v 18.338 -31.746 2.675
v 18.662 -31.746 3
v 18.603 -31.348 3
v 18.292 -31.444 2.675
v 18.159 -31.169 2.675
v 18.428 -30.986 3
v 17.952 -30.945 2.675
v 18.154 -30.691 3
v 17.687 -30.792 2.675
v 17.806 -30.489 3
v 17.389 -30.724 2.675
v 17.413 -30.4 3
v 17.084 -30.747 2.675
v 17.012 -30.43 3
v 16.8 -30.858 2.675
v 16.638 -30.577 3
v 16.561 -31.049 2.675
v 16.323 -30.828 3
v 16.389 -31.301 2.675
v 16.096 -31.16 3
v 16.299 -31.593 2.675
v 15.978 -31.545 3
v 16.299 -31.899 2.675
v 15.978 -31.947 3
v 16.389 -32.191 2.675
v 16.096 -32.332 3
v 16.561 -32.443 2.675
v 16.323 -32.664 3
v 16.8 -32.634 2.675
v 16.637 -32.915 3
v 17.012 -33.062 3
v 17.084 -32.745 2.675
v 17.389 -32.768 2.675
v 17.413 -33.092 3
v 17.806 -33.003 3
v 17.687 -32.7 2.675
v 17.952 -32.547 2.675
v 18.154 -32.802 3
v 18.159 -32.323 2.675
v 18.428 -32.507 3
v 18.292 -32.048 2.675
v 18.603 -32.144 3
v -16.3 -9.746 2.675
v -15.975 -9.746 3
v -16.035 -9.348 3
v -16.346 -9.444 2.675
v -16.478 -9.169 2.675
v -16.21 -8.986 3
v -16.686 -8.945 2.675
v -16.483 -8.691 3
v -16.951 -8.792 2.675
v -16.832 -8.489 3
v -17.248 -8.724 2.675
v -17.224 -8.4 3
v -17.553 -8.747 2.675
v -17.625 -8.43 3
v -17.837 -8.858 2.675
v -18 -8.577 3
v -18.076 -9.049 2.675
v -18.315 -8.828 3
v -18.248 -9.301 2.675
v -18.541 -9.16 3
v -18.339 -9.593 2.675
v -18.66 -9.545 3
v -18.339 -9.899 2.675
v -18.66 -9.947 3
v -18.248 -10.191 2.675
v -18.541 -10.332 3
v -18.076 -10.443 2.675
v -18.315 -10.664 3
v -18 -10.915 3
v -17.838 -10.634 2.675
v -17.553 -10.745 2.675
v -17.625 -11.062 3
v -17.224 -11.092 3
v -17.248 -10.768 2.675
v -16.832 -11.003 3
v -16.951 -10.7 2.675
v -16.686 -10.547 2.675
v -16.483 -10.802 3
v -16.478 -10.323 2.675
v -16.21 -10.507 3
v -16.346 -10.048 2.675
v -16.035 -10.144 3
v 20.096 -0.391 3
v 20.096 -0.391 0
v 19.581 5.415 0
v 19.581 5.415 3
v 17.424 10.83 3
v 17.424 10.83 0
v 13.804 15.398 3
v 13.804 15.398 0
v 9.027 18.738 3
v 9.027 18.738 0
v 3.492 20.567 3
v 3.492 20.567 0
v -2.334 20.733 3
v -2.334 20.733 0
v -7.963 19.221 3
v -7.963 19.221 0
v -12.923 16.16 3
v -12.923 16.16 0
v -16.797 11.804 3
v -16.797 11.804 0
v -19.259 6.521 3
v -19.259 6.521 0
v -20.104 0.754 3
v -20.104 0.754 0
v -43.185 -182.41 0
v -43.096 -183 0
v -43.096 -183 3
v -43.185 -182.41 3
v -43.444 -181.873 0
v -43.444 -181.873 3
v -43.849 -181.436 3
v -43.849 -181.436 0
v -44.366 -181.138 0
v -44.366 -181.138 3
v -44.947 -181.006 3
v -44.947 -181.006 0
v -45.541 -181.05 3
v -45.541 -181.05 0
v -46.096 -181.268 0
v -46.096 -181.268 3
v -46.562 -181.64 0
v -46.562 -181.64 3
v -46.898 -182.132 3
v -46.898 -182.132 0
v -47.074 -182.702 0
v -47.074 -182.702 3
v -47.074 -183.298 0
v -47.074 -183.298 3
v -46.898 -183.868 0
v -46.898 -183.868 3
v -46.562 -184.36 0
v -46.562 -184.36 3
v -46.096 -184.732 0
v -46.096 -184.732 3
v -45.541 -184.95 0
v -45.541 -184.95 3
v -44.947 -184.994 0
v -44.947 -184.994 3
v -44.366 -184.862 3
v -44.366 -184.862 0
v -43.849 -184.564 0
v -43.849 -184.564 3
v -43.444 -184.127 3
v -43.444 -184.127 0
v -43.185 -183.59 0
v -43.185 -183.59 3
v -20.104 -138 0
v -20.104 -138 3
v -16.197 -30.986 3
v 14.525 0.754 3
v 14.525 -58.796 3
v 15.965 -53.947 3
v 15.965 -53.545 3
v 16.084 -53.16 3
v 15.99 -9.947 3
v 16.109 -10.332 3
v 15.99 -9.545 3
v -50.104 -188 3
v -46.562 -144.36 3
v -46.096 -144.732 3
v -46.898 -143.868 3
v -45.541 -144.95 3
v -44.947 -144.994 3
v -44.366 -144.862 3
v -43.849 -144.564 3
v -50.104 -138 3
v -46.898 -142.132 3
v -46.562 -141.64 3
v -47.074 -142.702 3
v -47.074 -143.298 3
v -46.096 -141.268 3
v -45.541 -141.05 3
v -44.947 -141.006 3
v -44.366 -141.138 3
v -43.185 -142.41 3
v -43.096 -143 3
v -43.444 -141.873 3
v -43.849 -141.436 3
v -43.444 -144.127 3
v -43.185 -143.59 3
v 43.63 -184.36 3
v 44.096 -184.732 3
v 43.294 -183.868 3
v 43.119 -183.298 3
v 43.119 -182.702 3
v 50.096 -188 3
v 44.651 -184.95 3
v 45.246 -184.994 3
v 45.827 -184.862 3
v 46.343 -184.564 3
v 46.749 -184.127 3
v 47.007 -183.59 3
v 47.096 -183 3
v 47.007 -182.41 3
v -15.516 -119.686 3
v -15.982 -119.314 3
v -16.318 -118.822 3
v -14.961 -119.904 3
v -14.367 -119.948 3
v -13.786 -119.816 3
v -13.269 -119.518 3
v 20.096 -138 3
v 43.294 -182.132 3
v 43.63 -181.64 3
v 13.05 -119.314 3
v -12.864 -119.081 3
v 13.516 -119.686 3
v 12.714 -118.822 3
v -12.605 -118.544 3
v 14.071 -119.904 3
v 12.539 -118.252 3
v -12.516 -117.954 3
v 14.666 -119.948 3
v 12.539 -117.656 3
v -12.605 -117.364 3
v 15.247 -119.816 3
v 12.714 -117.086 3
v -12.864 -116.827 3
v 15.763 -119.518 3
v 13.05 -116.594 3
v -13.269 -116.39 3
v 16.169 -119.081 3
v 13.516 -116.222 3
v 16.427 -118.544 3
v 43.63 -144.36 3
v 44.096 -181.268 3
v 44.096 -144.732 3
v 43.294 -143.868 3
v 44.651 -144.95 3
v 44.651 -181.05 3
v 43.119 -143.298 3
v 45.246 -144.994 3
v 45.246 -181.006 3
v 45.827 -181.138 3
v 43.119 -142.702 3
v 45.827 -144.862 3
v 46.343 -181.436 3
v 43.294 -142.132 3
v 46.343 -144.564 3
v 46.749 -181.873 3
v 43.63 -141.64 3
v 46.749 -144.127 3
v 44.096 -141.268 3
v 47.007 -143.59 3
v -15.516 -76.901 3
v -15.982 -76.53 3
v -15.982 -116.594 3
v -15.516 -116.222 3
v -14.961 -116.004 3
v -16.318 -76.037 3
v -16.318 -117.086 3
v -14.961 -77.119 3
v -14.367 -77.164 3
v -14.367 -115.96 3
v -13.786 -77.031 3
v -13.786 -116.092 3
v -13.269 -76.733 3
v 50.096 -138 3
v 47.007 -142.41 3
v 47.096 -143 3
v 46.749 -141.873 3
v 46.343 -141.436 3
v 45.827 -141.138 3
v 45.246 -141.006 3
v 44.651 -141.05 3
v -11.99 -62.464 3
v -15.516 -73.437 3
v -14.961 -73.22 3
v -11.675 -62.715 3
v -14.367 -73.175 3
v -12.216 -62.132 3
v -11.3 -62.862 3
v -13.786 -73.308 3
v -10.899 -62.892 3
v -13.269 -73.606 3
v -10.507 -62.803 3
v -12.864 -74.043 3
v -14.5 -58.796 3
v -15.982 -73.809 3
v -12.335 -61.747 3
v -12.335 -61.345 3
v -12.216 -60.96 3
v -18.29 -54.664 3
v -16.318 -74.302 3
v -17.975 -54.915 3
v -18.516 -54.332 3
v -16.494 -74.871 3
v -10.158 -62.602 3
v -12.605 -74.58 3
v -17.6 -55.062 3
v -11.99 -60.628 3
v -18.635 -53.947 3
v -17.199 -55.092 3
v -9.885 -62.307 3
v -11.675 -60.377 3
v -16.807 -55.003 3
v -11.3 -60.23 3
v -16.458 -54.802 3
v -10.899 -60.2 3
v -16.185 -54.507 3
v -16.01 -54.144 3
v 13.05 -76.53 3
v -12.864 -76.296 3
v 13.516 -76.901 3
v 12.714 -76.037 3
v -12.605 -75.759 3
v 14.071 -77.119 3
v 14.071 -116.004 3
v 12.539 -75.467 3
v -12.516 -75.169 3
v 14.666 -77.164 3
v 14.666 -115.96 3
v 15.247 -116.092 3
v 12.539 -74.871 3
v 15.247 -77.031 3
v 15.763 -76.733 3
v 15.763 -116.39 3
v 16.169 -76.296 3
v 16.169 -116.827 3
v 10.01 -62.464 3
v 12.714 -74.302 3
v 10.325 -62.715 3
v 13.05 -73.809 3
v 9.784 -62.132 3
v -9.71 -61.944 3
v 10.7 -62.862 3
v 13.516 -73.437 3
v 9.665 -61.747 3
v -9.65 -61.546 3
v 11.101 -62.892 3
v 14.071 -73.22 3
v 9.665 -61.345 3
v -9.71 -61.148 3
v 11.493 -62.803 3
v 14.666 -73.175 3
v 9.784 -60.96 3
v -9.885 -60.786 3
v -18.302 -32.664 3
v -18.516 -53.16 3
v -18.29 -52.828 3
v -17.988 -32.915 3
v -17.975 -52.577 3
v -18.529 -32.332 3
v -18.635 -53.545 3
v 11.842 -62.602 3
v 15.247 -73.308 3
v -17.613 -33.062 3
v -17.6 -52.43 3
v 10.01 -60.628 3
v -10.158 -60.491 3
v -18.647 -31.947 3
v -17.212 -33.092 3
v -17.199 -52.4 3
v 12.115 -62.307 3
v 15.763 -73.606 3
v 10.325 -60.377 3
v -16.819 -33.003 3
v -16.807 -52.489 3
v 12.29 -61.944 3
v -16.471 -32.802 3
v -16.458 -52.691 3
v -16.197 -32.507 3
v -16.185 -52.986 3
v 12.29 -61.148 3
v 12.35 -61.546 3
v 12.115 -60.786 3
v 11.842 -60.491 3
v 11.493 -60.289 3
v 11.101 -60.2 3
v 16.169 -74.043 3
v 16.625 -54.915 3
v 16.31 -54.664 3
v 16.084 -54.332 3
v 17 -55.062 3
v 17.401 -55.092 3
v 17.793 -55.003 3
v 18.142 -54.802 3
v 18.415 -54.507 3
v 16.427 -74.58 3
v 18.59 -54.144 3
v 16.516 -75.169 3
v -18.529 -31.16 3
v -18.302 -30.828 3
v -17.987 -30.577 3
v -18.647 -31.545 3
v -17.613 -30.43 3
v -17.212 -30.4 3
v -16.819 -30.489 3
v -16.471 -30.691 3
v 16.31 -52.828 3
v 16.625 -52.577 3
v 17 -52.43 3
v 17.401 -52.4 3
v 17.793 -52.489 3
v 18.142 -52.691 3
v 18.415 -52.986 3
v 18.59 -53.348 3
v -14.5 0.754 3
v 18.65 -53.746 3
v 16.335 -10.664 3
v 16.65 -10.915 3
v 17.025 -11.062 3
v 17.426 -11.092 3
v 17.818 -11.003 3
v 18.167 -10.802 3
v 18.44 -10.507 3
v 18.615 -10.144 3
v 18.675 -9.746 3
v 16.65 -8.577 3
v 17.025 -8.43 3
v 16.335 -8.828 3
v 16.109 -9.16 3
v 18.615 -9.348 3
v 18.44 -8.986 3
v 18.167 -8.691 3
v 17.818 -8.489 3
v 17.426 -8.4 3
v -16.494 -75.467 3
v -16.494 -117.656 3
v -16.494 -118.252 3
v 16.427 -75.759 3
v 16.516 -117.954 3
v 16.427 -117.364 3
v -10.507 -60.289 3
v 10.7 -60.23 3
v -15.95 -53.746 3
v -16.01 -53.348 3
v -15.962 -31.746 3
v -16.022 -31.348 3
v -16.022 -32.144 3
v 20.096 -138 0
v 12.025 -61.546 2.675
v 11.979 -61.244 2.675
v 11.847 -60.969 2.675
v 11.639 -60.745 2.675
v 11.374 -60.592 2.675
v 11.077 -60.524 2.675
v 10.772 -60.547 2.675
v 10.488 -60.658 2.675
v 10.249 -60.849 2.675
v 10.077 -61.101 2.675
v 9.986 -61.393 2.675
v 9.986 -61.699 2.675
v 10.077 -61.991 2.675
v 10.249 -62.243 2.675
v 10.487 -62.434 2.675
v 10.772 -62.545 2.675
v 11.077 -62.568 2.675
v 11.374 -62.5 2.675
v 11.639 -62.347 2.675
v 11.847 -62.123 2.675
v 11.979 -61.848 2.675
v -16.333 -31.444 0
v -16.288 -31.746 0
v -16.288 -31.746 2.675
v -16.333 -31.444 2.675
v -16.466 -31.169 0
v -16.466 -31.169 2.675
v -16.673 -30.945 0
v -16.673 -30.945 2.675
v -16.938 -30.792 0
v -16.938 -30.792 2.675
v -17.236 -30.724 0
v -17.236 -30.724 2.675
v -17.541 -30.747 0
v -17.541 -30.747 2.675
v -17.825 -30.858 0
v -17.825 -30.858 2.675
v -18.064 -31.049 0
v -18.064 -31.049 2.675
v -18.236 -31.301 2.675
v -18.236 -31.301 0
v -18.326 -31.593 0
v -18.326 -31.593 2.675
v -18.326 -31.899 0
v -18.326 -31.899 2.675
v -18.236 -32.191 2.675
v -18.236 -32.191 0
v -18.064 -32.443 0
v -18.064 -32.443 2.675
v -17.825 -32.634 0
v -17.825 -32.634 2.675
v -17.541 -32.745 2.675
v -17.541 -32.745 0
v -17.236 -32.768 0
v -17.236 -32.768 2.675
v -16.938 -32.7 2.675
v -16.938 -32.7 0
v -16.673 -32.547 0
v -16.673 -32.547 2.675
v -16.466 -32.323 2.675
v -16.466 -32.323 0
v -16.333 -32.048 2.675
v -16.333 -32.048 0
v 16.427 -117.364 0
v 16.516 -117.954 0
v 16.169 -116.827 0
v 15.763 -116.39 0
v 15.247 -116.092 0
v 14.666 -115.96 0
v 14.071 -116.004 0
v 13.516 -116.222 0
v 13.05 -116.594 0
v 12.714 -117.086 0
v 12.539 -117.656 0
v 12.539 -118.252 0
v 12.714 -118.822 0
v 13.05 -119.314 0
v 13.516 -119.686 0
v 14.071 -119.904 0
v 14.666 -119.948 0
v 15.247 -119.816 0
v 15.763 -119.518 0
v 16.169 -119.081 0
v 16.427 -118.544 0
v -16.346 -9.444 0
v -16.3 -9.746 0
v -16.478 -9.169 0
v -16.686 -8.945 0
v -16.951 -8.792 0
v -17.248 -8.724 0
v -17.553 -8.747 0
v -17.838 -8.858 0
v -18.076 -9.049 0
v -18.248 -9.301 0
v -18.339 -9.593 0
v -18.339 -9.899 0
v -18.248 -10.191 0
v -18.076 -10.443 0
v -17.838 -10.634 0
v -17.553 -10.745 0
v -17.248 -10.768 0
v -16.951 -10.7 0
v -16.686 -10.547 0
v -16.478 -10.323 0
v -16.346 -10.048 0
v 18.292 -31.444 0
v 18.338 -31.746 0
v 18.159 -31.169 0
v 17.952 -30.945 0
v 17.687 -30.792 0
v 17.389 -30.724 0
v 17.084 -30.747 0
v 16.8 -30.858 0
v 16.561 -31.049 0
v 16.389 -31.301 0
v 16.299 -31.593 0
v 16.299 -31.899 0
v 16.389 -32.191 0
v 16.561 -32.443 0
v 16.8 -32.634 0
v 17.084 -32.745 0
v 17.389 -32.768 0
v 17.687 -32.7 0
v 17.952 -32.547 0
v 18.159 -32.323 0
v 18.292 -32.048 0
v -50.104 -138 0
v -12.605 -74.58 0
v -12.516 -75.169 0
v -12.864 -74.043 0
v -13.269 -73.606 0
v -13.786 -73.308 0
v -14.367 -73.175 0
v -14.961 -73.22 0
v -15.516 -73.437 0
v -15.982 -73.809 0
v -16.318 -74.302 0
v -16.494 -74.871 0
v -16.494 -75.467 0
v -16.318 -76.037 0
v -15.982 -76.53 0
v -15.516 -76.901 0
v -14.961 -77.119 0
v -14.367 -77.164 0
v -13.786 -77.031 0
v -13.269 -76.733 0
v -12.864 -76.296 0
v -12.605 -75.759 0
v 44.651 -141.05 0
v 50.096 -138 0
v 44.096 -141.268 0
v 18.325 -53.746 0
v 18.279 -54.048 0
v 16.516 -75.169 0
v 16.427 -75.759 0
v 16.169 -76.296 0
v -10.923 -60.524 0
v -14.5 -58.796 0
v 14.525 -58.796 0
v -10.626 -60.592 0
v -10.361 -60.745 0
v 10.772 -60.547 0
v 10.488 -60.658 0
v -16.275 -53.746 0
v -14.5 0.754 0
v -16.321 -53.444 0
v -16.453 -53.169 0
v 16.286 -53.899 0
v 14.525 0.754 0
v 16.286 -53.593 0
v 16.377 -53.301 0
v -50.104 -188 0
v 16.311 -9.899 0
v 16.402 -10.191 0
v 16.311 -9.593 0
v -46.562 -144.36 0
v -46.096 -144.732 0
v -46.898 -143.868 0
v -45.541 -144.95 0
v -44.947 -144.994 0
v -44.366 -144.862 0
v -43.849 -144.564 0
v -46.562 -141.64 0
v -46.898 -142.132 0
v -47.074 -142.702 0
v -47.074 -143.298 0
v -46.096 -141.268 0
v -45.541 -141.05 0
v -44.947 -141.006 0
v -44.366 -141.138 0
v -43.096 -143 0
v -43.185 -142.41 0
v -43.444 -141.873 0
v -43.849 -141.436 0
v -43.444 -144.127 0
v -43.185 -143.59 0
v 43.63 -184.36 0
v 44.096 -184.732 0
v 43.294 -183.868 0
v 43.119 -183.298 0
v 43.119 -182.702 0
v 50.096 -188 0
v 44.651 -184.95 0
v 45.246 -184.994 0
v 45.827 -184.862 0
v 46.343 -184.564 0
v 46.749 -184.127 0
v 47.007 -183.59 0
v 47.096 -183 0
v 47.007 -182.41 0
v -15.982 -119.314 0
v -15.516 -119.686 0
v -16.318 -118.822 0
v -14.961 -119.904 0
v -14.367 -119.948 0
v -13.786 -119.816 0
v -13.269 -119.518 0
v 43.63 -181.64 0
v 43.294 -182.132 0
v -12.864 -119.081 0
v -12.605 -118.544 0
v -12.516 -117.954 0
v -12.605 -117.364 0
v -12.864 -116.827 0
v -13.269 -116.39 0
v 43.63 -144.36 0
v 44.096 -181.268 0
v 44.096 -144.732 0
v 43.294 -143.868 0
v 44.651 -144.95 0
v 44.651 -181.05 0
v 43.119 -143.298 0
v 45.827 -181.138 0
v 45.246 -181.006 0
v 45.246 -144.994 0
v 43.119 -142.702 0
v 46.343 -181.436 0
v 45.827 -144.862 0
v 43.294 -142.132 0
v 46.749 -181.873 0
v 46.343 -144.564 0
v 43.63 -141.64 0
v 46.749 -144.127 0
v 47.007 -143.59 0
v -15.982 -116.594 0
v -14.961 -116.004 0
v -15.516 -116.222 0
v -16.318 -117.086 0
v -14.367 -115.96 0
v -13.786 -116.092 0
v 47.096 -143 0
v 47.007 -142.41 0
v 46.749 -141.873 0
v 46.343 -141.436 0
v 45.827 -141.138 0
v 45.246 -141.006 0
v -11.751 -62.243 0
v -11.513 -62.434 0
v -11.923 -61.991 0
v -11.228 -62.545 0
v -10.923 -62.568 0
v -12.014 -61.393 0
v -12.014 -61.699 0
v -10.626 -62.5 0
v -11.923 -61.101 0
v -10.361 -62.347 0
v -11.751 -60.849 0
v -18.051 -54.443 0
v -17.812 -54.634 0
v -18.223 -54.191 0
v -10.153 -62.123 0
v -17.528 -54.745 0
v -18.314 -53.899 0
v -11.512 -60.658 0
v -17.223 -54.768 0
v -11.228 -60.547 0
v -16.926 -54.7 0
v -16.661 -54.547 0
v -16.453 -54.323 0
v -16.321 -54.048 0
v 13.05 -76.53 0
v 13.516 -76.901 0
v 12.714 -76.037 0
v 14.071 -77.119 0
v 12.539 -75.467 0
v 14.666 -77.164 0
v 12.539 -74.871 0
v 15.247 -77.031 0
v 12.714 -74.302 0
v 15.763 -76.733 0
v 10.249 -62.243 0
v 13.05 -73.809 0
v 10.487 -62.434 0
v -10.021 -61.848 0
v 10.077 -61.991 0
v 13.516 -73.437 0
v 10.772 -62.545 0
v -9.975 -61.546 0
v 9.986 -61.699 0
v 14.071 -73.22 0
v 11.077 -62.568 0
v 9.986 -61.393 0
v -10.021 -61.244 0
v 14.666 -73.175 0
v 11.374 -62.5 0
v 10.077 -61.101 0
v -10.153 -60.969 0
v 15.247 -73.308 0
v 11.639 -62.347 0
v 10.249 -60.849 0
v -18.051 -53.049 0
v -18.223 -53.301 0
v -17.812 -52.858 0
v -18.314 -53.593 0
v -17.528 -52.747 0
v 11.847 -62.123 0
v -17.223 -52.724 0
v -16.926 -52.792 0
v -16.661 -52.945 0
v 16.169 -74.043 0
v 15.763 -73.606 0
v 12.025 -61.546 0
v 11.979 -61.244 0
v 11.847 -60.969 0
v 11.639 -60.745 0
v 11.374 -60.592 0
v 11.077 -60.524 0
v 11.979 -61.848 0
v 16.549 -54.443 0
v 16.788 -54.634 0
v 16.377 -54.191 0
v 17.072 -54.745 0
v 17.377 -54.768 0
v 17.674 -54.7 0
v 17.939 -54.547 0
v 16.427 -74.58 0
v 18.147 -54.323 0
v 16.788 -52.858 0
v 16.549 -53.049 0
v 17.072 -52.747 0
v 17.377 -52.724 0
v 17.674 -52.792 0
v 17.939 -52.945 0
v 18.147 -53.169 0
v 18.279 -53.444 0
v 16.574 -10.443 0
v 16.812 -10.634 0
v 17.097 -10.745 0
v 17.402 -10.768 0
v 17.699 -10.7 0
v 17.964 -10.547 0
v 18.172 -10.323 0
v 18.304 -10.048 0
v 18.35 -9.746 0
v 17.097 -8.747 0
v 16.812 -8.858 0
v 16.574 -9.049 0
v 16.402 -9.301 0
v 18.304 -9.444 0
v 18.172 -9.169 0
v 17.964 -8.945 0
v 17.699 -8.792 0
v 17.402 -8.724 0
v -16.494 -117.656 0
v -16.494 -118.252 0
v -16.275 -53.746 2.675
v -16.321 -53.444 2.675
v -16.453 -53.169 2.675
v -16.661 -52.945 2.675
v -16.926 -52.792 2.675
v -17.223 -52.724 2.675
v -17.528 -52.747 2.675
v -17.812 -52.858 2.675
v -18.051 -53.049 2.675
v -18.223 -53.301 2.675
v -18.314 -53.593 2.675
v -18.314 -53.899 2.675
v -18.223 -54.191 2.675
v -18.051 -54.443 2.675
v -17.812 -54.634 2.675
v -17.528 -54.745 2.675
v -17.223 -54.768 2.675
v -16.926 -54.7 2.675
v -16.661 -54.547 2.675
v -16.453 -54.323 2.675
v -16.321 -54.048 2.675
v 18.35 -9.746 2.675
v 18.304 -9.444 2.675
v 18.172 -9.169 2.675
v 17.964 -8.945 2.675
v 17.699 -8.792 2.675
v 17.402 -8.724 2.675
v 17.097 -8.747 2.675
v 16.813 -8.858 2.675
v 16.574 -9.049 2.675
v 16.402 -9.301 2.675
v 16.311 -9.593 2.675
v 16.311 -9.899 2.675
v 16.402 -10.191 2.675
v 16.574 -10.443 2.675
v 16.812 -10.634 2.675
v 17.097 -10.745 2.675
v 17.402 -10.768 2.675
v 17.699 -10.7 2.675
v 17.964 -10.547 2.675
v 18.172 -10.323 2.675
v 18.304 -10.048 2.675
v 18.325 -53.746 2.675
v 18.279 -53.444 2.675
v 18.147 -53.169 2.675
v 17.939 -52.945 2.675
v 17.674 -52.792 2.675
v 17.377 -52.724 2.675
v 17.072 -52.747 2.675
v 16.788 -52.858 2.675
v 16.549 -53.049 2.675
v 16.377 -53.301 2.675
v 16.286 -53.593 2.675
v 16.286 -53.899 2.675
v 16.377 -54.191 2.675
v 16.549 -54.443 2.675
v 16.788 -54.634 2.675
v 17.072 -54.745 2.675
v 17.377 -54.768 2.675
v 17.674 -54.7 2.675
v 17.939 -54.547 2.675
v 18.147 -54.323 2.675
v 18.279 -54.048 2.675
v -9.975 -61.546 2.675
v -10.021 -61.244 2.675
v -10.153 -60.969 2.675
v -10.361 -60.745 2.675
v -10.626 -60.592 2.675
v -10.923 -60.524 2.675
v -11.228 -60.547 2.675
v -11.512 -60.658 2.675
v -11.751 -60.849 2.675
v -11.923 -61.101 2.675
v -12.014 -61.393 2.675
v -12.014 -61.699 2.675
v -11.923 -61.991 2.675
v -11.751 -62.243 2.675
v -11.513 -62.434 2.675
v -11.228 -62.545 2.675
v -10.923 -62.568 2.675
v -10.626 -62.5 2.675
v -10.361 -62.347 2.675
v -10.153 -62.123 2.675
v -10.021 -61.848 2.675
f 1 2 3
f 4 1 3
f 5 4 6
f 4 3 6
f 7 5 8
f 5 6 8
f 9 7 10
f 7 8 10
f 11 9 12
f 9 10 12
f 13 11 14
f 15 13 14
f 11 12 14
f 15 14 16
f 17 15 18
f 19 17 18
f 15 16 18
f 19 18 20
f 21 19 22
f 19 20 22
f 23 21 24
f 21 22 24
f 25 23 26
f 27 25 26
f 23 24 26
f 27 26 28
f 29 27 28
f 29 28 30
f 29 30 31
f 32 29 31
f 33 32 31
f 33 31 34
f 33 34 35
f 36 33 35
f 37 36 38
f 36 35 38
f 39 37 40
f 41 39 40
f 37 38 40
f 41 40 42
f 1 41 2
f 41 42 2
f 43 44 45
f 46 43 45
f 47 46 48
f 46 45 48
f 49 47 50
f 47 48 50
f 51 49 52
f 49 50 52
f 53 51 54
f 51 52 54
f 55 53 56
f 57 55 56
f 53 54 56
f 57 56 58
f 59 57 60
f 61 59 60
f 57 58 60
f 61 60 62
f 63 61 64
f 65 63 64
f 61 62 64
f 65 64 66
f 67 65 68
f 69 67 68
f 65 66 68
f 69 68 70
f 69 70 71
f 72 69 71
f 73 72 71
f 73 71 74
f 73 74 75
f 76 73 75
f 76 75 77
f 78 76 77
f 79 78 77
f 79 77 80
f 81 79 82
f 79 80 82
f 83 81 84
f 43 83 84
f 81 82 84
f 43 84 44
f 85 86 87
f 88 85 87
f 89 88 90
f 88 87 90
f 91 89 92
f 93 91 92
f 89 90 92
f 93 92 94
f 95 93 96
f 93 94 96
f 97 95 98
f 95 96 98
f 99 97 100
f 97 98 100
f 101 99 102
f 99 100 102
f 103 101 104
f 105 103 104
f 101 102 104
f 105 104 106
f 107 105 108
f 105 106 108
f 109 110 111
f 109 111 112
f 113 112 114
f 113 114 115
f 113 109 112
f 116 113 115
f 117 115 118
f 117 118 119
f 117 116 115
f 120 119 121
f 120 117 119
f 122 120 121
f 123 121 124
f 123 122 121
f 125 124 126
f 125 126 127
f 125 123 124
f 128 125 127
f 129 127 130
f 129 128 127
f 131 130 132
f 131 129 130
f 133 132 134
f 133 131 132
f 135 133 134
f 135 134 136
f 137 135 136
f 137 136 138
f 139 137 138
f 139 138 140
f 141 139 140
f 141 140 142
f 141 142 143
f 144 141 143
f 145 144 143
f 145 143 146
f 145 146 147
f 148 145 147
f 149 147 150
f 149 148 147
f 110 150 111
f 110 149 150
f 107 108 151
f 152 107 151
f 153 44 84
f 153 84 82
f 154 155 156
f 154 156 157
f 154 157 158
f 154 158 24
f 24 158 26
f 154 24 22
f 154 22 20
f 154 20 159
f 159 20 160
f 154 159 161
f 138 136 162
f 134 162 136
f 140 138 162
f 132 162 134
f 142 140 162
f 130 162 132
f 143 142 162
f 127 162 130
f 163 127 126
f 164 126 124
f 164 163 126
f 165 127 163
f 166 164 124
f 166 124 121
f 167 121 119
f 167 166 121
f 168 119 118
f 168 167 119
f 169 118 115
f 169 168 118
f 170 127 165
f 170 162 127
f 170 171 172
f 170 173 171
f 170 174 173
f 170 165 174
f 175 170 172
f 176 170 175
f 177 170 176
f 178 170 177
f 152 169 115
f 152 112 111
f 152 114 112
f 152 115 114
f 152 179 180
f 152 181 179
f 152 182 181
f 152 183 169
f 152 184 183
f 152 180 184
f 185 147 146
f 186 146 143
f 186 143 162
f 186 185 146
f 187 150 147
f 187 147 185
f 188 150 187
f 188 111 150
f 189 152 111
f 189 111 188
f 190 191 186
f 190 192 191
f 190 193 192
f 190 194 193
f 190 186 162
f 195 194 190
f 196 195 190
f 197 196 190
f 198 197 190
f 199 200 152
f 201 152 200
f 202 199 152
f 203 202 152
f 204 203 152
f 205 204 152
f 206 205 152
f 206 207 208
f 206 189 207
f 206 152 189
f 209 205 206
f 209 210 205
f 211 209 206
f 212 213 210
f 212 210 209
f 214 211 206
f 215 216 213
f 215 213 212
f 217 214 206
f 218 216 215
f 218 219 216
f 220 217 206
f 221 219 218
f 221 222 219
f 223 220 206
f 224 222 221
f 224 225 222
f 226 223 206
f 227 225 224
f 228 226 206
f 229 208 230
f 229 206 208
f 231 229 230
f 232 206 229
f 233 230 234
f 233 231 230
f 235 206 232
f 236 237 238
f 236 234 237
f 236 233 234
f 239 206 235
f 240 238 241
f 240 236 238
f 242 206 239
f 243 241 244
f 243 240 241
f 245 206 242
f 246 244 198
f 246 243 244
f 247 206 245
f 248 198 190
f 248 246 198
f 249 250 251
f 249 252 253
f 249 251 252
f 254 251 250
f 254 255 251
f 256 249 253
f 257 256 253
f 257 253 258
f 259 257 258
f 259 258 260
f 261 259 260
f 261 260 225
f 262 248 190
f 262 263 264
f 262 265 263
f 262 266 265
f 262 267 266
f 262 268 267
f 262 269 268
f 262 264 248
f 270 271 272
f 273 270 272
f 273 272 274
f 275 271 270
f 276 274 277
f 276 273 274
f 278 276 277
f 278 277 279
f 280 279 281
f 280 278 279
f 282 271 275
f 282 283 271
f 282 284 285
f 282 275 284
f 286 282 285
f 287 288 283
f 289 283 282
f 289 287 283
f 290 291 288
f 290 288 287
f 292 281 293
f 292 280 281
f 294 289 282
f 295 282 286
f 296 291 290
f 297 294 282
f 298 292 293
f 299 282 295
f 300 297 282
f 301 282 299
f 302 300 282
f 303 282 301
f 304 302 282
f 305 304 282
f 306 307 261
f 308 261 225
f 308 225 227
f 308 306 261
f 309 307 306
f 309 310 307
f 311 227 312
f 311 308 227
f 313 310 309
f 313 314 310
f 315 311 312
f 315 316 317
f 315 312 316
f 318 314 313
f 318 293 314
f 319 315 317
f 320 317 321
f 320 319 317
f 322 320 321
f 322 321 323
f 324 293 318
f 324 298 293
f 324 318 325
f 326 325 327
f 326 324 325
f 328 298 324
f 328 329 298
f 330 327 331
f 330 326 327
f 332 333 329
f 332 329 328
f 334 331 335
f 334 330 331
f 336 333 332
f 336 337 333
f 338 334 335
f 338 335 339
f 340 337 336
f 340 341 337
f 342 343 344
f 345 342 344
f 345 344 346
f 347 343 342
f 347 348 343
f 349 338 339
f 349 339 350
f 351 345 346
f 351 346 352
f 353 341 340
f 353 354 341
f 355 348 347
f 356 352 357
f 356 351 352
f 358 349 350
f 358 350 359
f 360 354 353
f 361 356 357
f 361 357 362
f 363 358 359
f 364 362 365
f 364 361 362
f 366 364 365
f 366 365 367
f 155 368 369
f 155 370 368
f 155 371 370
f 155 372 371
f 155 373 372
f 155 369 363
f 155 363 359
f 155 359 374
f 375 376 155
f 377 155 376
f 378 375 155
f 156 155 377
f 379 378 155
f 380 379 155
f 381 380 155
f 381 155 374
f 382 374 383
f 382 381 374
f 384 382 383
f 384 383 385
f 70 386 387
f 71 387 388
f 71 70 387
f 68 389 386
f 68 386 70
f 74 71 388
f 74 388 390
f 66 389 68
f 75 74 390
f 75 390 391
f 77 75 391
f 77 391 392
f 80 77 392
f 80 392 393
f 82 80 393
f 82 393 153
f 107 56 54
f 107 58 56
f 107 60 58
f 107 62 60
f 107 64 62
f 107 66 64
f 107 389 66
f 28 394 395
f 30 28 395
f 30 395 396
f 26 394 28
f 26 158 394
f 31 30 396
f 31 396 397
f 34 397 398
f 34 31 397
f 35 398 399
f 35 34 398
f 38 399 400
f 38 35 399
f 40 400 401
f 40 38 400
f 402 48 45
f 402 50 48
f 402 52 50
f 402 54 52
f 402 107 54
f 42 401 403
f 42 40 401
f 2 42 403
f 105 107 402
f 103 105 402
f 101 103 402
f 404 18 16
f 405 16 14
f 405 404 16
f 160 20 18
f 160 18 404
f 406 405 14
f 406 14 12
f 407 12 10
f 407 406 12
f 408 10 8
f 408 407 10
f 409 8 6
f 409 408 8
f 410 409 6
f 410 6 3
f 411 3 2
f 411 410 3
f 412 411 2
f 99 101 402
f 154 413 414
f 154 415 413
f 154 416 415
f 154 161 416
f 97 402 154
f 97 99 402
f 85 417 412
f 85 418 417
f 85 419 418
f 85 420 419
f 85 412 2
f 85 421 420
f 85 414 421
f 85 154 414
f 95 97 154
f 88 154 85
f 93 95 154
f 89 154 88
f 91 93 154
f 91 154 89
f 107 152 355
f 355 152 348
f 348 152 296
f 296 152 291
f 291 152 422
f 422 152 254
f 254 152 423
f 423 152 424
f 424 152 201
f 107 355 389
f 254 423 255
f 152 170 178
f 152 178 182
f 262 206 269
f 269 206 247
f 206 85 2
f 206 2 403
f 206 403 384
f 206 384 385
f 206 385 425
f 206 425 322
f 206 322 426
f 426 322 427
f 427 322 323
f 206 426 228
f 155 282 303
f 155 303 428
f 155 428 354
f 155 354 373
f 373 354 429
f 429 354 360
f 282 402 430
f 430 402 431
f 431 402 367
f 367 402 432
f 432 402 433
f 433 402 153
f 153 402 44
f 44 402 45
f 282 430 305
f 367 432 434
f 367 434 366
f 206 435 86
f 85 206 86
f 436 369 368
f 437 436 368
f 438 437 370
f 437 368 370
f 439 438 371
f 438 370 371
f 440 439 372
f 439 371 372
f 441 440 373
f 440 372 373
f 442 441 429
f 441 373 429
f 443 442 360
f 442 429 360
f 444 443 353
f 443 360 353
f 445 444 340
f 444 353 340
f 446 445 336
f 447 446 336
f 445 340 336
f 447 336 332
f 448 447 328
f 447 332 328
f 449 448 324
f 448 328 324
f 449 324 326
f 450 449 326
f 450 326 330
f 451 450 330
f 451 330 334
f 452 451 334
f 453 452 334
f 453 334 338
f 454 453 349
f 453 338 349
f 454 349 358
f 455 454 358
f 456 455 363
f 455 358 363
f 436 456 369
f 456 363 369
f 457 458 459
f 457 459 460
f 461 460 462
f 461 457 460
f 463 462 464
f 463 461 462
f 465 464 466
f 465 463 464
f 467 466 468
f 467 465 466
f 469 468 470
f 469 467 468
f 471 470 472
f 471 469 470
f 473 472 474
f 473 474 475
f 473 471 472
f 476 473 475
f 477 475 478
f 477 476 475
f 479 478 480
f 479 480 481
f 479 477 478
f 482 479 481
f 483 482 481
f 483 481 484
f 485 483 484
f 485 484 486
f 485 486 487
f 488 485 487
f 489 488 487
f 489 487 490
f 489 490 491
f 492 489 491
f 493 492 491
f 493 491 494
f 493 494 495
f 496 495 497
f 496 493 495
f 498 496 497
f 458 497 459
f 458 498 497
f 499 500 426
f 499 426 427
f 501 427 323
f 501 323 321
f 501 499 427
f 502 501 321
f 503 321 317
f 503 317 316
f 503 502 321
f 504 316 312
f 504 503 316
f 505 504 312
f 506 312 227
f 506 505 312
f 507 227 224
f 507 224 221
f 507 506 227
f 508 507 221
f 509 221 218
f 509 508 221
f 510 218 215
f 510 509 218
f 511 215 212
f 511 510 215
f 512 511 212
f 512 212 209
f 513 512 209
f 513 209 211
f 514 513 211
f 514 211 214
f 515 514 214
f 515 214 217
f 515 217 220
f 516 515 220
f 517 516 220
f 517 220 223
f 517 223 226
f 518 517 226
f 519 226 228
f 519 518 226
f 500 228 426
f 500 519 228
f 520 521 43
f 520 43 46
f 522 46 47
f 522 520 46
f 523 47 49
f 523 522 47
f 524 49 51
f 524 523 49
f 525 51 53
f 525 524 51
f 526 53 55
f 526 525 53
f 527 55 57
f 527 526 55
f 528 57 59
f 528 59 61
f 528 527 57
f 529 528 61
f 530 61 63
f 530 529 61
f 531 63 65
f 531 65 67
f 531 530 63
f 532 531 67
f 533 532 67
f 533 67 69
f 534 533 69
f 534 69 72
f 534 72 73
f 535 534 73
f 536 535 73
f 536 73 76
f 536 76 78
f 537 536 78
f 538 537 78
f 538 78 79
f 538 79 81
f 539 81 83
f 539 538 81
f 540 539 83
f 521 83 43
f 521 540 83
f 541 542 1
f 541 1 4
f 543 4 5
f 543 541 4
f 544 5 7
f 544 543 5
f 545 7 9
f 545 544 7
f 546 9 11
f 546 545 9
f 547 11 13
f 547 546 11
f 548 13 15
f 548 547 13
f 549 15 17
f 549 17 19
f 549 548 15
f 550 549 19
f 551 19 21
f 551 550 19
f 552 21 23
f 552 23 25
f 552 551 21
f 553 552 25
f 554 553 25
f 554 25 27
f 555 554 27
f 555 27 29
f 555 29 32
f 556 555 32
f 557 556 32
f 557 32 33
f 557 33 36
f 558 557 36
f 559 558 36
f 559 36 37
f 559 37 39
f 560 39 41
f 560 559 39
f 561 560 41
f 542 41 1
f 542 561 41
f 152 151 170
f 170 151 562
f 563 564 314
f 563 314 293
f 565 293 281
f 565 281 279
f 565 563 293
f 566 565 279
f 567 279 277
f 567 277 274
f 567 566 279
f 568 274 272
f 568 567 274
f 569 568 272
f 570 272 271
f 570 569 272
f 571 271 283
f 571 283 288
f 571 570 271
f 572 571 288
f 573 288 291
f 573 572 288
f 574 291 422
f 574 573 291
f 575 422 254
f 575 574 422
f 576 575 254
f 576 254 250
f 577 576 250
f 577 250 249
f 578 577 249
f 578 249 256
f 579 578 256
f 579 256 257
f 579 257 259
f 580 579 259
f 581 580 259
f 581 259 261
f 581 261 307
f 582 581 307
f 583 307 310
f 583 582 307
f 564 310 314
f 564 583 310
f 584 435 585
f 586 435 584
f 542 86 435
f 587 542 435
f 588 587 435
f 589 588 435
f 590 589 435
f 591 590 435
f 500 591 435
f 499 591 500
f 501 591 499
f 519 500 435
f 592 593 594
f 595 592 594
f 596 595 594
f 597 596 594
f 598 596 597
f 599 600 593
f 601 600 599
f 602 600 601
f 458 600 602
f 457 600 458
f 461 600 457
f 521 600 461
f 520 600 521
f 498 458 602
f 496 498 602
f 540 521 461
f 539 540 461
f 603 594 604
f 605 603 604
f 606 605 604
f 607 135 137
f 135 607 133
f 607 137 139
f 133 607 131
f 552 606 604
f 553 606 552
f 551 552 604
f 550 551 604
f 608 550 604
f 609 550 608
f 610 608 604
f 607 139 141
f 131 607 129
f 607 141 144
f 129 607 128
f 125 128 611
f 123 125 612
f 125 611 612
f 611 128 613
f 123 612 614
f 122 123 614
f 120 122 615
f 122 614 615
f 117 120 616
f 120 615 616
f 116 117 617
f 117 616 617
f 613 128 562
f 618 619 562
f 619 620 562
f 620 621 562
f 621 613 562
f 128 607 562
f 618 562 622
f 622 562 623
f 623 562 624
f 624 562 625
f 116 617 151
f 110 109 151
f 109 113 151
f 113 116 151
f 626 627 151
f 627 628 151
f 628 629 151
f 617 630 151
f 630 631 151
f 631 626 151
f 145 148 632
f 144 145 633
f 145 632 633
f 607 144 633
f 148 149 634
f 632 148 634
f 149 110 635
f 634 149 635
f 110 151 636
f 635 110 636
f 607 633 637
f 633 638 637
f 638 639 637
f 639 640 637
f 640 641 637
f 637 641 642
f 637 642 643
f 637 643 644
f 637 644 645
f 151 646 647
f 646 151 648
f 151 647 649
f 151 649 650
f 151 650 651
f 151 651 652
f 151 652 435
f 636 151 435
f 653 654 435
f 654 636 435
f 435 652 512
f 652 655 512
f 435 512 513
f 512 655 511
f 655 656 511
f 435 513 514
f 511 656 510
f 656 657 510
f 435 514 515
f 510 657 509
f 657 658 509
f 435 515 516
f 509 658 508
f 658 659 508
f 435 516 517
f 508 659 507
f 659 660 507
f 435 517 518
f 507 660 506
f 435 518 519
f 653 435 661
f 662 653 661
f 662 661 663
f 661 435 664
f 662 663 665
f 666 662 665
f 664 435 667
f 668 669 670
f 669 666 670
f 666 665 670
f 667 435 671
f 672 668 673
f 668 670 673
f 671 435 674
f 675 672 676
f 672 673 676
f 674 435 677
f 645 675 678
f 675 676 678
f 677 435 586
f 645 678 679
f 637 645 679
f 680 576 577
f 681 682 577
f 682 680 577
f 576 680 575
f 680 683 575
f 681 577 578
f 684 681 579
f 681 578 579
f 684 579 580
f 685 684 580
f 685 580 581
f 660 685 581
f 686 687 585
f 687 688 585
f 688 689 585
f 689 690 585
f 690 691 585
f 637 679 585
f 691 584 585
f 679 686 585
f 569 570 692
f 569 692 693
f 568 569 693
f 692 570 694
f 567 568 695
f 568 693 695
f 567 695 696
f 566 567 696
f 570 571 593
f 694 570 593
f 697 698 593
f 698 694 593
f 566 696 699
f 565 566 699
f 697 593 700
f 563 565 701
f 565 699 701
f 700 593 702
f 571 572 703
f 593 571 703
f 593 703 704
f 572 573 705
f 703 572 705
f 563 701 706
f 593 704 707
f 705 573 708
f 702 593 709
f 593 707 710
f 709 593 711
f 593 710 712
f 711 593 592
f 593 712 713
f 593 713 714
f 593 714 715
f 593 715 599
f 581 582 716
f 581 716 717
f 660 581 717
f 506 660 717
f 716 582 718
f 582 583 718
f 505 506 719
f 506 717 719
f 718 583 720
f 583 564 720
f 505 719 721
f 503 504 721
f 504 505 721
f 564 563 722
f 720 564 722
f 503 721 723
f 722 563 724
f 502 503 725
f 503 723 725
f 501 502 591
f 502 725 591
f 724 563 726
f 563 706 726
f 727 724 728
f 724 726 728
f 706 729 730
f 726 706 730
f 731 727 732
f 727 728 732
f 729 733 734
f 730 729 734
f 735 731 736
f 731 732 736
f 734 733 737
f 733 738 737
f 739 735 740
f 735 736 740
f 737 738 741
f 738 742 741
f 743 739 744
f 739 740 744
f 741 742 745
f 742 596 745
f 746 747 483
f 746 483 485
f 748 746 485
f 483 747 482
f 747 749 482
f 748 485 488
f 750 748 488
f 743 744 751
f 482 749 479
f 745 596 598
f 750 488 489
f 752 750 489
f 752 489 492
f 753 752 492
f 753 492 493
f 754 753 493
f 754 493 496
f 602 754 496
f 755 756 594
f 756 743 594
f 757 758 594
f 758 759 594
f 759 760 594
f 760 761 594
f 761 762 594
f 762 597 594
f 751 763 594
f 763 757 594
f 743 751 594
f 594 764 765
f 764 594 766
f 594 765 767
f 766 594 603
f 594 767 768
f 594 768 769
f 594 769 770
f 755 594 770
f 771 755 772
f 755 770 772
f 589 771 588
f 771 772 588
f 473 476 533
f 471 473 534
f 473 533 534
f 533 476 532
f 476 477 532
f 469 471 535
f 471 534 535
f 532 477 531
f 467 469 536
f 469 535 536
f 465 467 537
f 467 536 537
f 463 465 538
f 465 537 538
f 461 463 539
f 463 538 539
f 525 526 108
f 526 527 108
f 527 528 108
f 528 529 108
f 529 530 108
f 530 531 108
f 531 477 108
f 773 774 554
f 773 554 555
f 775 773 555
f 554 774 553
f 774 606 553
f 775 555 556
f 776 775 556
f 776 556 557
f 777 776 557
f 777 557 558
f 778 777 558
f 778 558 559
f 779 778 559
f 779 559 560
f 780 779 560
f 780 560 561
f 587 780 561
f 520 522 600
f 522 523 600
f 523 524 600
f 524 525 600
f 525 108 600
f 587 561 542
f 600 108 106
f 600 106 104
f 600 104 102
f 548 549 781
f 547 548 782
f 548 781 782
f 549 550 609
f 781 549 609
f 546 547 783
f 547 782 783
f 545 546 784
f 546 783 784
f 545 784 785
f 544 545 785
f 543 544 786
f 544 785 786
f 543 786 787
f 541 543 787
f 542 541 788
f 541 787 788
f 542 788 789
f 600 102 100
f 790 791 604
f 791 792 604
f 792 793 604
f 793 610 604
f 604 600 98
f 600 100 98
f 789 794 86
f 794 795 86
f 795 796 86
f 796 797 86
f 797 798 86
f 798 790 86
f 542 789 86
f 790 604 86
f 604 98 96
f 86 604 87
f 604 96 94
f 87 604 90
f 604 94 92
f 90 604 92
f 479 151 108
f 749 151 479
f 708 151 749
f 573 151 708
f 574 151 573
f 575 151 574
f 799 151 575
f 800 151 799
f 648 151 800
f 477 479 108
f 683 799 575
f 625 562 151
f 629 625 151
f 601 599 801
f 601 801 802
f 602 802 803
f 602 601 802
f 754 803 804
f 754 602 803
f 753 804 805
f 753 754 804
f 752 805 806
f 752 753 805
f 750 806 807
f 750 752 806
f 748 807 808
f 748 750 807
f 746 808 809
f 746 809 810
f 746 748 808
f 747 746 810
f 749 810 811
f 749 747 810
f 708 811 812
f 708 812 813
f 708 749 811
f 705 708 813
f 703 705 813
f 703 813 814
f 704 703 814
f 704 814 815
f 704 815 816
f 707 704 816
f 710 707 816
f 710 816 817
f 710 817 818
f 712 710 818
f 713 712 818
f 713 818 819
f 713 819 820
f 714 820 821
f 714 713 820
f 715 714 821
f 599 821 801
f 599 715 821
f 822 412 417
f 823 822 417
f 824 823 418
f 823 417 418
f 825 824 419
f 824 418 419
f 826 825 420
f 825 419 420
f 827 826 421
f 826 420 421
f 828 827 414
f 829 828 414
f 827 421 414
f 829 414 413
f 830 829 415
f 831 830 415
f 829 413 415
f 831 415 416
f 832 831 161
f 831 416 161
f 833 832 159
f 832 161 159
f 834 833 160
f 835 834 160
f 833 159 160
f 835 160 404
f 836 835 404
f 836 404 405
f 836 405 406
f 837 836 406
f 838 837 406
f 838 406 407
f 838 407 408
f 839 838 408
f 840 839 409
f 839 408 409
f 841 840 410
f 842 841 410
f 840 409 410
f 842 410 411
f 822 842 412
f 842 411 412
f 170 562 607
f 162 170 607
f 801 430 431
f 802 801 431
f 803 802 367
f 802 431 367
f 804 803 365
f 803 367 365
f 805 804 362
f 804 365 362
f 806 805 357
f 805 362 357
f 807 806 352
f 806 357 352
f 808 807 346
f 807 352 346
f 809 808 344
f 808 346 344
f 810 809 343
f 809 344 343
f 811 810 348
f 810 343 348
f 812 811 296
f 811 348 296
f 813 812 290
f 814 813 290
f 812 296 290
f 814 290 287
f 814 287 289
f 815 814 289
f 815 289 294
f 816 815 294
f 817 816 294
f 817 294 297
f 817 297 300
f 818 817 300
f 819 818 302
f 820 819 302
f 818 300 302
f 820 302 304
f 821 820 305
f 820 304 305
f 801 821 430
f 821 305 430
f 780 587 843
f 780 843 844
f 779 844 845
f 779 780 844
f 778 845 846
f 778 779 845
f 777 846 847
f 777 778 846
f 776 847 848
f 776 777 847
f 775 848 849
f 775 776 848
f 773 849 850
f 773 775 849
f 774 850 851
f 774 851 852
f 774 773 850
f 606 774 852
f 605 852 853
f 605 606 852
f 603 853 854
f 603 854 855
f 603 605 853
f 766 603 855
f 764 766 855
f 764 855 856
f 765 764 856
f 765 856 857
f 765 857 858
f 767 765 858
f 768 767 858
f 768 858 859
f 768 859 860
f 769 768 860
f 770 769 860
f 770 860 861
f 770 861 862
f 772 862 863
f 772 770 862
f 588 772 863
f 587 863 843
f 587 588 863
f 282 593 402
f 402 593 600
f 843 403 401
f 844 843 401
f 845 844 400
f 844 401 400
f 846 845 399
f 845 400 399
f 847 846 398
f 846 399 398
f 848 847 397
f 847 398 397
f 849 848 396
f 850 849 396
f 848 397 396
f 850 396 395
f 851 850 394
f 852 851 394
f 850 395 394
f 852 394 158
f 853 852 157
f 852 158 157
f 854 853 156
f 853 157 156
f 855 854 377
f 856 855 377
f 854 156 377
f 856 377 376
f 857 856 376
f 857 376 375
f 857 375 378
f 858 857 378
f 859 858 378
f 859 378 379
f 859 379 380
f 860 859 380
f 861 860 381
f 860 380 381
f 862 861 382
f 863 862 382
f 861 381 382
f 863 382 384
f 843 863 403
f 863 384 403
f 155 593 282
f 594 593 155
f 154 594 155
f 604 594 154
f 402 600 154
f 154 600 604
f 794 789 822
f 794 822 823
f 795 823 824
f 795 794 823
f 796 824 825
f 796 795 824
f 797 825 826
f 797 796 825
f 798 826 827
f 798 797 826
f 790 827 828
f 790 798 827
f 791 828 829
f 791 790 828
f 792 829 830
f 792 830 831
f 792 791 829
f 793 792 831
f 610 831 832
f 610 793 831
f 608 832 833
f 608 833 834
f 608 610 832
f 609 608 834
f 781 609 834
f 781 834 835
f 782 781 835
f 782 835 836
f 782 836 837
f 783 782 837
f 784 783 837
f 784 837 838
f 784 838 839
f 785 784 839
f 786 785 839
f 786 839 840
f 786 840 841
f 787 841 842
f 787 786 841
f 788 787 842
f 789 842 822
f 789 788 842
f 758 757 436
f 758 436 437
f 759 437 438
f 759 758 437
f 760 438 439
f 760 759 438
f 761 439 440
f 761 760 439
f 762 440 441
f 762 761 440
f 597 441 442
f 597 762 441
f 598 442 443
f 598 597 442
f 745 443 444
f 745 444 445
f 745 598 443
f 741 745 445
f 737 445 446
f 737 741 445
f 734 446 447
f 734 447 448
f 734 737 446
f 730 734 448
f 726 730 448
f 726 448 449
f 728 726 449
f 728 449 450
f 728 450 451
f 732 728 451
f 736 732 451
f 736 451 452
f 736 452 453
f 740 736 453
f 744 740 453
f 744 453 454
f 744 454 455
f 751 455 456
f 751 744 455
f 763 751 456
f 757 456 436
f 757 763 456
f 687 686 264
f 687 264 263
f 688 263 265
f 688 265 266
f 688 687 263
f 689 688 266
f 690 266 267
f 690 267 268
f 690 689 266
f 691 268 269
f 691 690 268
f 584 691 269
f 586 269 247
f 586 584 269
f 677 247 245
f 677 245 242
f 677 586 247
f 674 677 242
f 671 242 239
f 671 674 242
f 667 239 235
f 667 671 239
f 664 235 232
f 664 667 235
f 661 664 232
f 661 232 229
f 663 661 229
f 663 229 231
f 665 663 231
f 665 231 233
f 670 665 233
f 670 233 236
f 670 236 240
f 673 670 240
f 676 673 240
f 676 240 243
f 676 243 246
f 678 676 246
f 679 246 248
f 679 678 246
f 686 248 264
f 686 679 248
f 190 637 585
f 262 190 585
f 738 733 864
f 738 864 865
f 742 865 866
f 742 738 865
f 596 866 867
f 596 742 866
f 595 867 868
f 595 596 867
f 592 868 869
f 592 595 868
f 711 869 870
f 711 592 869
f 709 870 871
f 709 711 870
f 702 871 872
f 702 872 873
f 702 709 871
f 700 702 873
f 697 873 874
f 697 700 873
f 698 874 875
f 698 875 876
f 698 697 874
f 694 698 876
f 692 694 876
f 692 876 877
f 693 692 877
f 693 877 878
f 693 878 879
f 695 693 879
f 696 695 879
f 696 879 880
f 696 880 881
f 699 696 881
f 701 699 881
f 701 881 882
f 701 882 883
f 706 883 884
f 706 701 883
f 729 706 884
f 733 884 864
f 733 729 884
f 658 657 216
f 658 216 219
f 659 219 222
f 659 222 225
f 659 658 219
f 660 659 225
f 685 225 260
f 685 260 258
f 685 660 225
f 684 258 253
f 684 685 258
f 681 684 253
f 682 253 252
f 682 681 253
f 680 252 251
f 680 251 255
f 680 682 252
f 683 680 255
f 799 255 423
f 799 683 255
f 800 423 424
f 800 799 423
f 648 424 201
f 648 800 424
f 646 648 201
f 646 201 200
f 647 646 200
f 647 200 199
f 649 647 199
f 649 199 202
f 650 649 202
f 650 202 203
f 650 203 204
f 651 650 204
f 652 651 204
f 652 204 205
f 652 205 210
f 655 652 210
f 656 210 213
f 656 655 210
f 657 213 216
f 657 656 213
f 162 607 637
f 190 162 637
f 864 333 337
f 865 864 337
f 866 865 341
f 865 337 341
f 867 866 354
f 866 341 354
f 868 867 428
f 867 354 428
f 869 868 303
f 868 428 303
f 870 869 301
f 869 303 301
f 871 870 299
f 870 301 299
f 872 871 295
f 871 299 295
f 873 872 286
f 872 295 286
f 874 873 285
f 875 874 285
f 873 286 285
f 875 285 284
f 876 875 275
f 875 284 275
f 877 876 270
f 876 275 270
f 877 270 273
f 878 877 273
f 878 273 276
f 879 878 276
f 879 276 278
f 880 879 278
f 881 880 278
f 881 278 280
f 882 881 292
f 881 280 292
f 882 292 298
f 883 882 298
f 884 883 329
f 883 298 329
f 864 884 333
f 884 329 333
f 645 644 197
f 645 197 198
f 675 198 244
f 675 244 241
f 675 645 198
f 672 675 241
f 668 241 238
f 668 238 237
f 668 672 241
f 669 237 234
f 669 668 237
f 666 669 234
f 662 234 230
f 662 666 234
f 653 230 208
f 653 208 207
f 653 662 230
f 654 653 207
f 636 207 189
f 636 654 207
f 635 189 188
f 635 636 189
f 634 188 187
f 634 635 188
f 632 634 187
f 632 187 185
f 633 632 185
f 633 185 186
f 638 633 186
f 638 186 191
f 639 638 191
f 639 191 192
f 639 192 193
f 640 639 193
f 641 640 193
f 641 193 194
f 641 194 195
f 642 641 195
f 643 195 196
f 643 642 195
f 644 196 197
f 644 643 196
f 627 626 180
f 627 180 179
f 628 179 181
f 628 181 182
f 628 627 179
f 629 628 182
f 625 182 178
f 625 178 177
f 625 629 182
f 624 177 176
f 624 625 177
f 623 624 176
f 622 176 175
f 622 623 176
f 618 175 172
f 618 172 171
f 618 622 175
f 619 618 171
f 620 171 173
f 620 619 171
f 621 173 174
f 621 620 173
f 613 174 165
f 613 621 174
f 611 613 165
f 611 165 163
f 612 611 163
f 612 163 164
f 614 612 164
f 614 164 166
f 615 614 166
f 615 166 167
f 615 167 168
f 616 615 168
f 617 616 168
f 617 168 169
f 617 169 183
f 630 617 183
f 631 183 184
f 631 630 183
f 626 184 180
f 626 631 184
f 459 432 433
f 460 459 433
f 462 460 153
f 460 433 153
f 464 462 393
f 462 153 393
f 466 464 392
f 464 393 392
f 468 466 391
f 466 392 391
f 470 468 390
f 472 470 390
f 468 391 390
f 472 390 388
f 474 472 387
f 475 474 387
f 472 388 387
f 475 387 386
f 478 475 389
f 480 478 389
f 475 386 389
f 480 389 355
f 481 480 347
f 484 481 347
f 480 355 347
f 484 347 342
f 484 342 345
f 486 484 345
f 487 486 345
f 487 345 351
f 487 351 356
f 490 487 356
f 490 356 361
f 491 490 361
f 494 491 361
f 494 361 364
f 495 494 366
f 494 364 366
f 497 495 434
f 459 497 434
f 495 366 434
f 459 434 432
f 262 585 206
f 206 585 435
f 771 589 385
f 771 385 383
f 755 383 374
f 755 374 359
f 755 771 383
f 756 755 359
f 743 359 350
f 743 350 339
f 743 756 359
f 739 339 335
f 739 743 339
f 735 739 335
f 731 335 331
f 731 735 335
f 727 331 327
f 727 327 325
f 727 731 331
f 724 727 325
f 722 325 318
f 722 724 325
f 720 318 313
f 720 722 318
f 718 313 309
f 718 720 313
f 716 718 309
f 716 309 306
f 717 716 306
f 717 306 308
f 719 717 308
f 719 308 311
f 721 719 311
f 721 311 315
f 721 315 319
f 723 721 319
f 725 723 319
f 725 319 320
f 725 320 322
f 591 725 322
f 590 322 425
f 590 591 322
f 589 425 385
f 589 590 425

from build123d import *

# Parameters (mm, degrees)
ESBO_O1_R                = 2
ESBO_O1_R_2              = 1.025
ESBO_O1_W                = 29.025
ESBO_O1_H                = 59.55
RESSALTO_EXTRUS_O2_DEPTH = 3
CHANFRO1_SIZE            = 0.325


with BuildPart() as part:
    # Esboço1 → Ressalto-extrusão2 (new body)
    with BuildSketch(Plane.XY):
        with BuildLine():
            Line((-20.103801855, 0.75392245), (-20.103801855, -138))
            Line((-20.103801855, -138), (-50.103801855, -138))
            Line((-50.103801855, -138), (-50.103801855, -188))
            Line((-50.103801855, -188), (50.096198145, -188))
            Line((50.096198145, -188), (50.096198145, -138))
            Line((50.096198145, -138), (20.096198145, -138))
            Line((20.096198145, -138), (20.096198145, -0.390922156))
            ThreePointArc((20.096198145, -0.390922156), (0.585154384, 20.862071726), (-20.103801855, 0.75392245))
        make_face()
        with Locations((45.096198145, -143)):
            Circle(ESBO_O1_R, mode=Mode.SUBTRACT)
        with Locations((45.096198145, -183)):
            Circle(ESBO_O1_R, mode=Mode.SUBTRACT)
        with Locations((-45.096198145, -183)):
            Circle(ESBO_O1_R, mode=Mode.SUBTRACT)
        with Locations((-45.096198145, -143)):
            Circle(ESBO_O1_R, mode=Mode.SUBTRACT)
        with Locations((14.516198145, -75.169414559)):
            Circle(ESBO_O1_R, mode=Mode.SUBTRACT)
        with Locations((14.516198145, -117.953999713)):
            Circle(ESBO_O1_R, mode=Mode.SUBTRACT)
        with Locations((-14.516198145, -117.953999713)):
            Circle(ESBO_O1_R, mode=Mode.SUBTRACT)
        with Locations((-14.516198145, -75.169414559)):
            Circle(ESBO_O1_R, mode=Mode.SUBTRACT)
        with Locations((17.325, -9.74607755)):
            Circle(ESBO_O1_R_2, mode=Mode.SUBTRACT)
        with Locations((-17.325, -9.74607755)):
            Circle(ESBO_O1_R_2, mode=Mode.SUBTRACT)
        with Locations((17.3125, -31.746073996)):
            Circle(ESBO_O1_R_2, mode=Mode.SUBTRACT)
        with Locations((17.3, -53.746070443)):
            Circle(ESBO_O1_R_2, mode=Mode.SUBTRACT)
        with Locations((-17.3, -53.746070443)):
            Circle(ESBO_O1_R_2, mode=Mode.SUBTRACT)
        with Locations((-17.3125, -31.746073996)):
            Circle(ESBO_O1_R_2, mode=Mode.SUBTRACT)
        with Locations((11, -61.546070443)):
            Circle(ESBO_O1_R_2, mode=Mode.SUBTRACT)
        with Locations((-11, -61.546070443)):
            Circle(ESBO_O1_R_2, mode=Mode.SUBTRACT)
        with Locations((0.0125, -29.02107755)):
            Rectangle(ESBO_O1_W, ESBO_O1_H, mode=Mode.SUBTRACT)
    extrude(amount=RESSALTO_EXTRUS_O2_DEPTH)

    # Chanfro1
    chanfro1_edges = [part.edges().sort_by_distance(p)[0] for p in [
        (16.2875, -31.746073996, 3),
        (16.275, -53.746070443, 3),
        (-18.325, -53.746070443, 3),
        (9.975, -61.546070443, 3),
        (-12.025, -61.546070443, 3),
        (-18.3375, -31.746073996, 3),
        (-18.35, -9.74607755, 3),
        (16.3, -9.74607755, 3),
    ]]
    chamfer(chanfro1_edges, length=CHANFRO1_SIZE)


solid = part.part
